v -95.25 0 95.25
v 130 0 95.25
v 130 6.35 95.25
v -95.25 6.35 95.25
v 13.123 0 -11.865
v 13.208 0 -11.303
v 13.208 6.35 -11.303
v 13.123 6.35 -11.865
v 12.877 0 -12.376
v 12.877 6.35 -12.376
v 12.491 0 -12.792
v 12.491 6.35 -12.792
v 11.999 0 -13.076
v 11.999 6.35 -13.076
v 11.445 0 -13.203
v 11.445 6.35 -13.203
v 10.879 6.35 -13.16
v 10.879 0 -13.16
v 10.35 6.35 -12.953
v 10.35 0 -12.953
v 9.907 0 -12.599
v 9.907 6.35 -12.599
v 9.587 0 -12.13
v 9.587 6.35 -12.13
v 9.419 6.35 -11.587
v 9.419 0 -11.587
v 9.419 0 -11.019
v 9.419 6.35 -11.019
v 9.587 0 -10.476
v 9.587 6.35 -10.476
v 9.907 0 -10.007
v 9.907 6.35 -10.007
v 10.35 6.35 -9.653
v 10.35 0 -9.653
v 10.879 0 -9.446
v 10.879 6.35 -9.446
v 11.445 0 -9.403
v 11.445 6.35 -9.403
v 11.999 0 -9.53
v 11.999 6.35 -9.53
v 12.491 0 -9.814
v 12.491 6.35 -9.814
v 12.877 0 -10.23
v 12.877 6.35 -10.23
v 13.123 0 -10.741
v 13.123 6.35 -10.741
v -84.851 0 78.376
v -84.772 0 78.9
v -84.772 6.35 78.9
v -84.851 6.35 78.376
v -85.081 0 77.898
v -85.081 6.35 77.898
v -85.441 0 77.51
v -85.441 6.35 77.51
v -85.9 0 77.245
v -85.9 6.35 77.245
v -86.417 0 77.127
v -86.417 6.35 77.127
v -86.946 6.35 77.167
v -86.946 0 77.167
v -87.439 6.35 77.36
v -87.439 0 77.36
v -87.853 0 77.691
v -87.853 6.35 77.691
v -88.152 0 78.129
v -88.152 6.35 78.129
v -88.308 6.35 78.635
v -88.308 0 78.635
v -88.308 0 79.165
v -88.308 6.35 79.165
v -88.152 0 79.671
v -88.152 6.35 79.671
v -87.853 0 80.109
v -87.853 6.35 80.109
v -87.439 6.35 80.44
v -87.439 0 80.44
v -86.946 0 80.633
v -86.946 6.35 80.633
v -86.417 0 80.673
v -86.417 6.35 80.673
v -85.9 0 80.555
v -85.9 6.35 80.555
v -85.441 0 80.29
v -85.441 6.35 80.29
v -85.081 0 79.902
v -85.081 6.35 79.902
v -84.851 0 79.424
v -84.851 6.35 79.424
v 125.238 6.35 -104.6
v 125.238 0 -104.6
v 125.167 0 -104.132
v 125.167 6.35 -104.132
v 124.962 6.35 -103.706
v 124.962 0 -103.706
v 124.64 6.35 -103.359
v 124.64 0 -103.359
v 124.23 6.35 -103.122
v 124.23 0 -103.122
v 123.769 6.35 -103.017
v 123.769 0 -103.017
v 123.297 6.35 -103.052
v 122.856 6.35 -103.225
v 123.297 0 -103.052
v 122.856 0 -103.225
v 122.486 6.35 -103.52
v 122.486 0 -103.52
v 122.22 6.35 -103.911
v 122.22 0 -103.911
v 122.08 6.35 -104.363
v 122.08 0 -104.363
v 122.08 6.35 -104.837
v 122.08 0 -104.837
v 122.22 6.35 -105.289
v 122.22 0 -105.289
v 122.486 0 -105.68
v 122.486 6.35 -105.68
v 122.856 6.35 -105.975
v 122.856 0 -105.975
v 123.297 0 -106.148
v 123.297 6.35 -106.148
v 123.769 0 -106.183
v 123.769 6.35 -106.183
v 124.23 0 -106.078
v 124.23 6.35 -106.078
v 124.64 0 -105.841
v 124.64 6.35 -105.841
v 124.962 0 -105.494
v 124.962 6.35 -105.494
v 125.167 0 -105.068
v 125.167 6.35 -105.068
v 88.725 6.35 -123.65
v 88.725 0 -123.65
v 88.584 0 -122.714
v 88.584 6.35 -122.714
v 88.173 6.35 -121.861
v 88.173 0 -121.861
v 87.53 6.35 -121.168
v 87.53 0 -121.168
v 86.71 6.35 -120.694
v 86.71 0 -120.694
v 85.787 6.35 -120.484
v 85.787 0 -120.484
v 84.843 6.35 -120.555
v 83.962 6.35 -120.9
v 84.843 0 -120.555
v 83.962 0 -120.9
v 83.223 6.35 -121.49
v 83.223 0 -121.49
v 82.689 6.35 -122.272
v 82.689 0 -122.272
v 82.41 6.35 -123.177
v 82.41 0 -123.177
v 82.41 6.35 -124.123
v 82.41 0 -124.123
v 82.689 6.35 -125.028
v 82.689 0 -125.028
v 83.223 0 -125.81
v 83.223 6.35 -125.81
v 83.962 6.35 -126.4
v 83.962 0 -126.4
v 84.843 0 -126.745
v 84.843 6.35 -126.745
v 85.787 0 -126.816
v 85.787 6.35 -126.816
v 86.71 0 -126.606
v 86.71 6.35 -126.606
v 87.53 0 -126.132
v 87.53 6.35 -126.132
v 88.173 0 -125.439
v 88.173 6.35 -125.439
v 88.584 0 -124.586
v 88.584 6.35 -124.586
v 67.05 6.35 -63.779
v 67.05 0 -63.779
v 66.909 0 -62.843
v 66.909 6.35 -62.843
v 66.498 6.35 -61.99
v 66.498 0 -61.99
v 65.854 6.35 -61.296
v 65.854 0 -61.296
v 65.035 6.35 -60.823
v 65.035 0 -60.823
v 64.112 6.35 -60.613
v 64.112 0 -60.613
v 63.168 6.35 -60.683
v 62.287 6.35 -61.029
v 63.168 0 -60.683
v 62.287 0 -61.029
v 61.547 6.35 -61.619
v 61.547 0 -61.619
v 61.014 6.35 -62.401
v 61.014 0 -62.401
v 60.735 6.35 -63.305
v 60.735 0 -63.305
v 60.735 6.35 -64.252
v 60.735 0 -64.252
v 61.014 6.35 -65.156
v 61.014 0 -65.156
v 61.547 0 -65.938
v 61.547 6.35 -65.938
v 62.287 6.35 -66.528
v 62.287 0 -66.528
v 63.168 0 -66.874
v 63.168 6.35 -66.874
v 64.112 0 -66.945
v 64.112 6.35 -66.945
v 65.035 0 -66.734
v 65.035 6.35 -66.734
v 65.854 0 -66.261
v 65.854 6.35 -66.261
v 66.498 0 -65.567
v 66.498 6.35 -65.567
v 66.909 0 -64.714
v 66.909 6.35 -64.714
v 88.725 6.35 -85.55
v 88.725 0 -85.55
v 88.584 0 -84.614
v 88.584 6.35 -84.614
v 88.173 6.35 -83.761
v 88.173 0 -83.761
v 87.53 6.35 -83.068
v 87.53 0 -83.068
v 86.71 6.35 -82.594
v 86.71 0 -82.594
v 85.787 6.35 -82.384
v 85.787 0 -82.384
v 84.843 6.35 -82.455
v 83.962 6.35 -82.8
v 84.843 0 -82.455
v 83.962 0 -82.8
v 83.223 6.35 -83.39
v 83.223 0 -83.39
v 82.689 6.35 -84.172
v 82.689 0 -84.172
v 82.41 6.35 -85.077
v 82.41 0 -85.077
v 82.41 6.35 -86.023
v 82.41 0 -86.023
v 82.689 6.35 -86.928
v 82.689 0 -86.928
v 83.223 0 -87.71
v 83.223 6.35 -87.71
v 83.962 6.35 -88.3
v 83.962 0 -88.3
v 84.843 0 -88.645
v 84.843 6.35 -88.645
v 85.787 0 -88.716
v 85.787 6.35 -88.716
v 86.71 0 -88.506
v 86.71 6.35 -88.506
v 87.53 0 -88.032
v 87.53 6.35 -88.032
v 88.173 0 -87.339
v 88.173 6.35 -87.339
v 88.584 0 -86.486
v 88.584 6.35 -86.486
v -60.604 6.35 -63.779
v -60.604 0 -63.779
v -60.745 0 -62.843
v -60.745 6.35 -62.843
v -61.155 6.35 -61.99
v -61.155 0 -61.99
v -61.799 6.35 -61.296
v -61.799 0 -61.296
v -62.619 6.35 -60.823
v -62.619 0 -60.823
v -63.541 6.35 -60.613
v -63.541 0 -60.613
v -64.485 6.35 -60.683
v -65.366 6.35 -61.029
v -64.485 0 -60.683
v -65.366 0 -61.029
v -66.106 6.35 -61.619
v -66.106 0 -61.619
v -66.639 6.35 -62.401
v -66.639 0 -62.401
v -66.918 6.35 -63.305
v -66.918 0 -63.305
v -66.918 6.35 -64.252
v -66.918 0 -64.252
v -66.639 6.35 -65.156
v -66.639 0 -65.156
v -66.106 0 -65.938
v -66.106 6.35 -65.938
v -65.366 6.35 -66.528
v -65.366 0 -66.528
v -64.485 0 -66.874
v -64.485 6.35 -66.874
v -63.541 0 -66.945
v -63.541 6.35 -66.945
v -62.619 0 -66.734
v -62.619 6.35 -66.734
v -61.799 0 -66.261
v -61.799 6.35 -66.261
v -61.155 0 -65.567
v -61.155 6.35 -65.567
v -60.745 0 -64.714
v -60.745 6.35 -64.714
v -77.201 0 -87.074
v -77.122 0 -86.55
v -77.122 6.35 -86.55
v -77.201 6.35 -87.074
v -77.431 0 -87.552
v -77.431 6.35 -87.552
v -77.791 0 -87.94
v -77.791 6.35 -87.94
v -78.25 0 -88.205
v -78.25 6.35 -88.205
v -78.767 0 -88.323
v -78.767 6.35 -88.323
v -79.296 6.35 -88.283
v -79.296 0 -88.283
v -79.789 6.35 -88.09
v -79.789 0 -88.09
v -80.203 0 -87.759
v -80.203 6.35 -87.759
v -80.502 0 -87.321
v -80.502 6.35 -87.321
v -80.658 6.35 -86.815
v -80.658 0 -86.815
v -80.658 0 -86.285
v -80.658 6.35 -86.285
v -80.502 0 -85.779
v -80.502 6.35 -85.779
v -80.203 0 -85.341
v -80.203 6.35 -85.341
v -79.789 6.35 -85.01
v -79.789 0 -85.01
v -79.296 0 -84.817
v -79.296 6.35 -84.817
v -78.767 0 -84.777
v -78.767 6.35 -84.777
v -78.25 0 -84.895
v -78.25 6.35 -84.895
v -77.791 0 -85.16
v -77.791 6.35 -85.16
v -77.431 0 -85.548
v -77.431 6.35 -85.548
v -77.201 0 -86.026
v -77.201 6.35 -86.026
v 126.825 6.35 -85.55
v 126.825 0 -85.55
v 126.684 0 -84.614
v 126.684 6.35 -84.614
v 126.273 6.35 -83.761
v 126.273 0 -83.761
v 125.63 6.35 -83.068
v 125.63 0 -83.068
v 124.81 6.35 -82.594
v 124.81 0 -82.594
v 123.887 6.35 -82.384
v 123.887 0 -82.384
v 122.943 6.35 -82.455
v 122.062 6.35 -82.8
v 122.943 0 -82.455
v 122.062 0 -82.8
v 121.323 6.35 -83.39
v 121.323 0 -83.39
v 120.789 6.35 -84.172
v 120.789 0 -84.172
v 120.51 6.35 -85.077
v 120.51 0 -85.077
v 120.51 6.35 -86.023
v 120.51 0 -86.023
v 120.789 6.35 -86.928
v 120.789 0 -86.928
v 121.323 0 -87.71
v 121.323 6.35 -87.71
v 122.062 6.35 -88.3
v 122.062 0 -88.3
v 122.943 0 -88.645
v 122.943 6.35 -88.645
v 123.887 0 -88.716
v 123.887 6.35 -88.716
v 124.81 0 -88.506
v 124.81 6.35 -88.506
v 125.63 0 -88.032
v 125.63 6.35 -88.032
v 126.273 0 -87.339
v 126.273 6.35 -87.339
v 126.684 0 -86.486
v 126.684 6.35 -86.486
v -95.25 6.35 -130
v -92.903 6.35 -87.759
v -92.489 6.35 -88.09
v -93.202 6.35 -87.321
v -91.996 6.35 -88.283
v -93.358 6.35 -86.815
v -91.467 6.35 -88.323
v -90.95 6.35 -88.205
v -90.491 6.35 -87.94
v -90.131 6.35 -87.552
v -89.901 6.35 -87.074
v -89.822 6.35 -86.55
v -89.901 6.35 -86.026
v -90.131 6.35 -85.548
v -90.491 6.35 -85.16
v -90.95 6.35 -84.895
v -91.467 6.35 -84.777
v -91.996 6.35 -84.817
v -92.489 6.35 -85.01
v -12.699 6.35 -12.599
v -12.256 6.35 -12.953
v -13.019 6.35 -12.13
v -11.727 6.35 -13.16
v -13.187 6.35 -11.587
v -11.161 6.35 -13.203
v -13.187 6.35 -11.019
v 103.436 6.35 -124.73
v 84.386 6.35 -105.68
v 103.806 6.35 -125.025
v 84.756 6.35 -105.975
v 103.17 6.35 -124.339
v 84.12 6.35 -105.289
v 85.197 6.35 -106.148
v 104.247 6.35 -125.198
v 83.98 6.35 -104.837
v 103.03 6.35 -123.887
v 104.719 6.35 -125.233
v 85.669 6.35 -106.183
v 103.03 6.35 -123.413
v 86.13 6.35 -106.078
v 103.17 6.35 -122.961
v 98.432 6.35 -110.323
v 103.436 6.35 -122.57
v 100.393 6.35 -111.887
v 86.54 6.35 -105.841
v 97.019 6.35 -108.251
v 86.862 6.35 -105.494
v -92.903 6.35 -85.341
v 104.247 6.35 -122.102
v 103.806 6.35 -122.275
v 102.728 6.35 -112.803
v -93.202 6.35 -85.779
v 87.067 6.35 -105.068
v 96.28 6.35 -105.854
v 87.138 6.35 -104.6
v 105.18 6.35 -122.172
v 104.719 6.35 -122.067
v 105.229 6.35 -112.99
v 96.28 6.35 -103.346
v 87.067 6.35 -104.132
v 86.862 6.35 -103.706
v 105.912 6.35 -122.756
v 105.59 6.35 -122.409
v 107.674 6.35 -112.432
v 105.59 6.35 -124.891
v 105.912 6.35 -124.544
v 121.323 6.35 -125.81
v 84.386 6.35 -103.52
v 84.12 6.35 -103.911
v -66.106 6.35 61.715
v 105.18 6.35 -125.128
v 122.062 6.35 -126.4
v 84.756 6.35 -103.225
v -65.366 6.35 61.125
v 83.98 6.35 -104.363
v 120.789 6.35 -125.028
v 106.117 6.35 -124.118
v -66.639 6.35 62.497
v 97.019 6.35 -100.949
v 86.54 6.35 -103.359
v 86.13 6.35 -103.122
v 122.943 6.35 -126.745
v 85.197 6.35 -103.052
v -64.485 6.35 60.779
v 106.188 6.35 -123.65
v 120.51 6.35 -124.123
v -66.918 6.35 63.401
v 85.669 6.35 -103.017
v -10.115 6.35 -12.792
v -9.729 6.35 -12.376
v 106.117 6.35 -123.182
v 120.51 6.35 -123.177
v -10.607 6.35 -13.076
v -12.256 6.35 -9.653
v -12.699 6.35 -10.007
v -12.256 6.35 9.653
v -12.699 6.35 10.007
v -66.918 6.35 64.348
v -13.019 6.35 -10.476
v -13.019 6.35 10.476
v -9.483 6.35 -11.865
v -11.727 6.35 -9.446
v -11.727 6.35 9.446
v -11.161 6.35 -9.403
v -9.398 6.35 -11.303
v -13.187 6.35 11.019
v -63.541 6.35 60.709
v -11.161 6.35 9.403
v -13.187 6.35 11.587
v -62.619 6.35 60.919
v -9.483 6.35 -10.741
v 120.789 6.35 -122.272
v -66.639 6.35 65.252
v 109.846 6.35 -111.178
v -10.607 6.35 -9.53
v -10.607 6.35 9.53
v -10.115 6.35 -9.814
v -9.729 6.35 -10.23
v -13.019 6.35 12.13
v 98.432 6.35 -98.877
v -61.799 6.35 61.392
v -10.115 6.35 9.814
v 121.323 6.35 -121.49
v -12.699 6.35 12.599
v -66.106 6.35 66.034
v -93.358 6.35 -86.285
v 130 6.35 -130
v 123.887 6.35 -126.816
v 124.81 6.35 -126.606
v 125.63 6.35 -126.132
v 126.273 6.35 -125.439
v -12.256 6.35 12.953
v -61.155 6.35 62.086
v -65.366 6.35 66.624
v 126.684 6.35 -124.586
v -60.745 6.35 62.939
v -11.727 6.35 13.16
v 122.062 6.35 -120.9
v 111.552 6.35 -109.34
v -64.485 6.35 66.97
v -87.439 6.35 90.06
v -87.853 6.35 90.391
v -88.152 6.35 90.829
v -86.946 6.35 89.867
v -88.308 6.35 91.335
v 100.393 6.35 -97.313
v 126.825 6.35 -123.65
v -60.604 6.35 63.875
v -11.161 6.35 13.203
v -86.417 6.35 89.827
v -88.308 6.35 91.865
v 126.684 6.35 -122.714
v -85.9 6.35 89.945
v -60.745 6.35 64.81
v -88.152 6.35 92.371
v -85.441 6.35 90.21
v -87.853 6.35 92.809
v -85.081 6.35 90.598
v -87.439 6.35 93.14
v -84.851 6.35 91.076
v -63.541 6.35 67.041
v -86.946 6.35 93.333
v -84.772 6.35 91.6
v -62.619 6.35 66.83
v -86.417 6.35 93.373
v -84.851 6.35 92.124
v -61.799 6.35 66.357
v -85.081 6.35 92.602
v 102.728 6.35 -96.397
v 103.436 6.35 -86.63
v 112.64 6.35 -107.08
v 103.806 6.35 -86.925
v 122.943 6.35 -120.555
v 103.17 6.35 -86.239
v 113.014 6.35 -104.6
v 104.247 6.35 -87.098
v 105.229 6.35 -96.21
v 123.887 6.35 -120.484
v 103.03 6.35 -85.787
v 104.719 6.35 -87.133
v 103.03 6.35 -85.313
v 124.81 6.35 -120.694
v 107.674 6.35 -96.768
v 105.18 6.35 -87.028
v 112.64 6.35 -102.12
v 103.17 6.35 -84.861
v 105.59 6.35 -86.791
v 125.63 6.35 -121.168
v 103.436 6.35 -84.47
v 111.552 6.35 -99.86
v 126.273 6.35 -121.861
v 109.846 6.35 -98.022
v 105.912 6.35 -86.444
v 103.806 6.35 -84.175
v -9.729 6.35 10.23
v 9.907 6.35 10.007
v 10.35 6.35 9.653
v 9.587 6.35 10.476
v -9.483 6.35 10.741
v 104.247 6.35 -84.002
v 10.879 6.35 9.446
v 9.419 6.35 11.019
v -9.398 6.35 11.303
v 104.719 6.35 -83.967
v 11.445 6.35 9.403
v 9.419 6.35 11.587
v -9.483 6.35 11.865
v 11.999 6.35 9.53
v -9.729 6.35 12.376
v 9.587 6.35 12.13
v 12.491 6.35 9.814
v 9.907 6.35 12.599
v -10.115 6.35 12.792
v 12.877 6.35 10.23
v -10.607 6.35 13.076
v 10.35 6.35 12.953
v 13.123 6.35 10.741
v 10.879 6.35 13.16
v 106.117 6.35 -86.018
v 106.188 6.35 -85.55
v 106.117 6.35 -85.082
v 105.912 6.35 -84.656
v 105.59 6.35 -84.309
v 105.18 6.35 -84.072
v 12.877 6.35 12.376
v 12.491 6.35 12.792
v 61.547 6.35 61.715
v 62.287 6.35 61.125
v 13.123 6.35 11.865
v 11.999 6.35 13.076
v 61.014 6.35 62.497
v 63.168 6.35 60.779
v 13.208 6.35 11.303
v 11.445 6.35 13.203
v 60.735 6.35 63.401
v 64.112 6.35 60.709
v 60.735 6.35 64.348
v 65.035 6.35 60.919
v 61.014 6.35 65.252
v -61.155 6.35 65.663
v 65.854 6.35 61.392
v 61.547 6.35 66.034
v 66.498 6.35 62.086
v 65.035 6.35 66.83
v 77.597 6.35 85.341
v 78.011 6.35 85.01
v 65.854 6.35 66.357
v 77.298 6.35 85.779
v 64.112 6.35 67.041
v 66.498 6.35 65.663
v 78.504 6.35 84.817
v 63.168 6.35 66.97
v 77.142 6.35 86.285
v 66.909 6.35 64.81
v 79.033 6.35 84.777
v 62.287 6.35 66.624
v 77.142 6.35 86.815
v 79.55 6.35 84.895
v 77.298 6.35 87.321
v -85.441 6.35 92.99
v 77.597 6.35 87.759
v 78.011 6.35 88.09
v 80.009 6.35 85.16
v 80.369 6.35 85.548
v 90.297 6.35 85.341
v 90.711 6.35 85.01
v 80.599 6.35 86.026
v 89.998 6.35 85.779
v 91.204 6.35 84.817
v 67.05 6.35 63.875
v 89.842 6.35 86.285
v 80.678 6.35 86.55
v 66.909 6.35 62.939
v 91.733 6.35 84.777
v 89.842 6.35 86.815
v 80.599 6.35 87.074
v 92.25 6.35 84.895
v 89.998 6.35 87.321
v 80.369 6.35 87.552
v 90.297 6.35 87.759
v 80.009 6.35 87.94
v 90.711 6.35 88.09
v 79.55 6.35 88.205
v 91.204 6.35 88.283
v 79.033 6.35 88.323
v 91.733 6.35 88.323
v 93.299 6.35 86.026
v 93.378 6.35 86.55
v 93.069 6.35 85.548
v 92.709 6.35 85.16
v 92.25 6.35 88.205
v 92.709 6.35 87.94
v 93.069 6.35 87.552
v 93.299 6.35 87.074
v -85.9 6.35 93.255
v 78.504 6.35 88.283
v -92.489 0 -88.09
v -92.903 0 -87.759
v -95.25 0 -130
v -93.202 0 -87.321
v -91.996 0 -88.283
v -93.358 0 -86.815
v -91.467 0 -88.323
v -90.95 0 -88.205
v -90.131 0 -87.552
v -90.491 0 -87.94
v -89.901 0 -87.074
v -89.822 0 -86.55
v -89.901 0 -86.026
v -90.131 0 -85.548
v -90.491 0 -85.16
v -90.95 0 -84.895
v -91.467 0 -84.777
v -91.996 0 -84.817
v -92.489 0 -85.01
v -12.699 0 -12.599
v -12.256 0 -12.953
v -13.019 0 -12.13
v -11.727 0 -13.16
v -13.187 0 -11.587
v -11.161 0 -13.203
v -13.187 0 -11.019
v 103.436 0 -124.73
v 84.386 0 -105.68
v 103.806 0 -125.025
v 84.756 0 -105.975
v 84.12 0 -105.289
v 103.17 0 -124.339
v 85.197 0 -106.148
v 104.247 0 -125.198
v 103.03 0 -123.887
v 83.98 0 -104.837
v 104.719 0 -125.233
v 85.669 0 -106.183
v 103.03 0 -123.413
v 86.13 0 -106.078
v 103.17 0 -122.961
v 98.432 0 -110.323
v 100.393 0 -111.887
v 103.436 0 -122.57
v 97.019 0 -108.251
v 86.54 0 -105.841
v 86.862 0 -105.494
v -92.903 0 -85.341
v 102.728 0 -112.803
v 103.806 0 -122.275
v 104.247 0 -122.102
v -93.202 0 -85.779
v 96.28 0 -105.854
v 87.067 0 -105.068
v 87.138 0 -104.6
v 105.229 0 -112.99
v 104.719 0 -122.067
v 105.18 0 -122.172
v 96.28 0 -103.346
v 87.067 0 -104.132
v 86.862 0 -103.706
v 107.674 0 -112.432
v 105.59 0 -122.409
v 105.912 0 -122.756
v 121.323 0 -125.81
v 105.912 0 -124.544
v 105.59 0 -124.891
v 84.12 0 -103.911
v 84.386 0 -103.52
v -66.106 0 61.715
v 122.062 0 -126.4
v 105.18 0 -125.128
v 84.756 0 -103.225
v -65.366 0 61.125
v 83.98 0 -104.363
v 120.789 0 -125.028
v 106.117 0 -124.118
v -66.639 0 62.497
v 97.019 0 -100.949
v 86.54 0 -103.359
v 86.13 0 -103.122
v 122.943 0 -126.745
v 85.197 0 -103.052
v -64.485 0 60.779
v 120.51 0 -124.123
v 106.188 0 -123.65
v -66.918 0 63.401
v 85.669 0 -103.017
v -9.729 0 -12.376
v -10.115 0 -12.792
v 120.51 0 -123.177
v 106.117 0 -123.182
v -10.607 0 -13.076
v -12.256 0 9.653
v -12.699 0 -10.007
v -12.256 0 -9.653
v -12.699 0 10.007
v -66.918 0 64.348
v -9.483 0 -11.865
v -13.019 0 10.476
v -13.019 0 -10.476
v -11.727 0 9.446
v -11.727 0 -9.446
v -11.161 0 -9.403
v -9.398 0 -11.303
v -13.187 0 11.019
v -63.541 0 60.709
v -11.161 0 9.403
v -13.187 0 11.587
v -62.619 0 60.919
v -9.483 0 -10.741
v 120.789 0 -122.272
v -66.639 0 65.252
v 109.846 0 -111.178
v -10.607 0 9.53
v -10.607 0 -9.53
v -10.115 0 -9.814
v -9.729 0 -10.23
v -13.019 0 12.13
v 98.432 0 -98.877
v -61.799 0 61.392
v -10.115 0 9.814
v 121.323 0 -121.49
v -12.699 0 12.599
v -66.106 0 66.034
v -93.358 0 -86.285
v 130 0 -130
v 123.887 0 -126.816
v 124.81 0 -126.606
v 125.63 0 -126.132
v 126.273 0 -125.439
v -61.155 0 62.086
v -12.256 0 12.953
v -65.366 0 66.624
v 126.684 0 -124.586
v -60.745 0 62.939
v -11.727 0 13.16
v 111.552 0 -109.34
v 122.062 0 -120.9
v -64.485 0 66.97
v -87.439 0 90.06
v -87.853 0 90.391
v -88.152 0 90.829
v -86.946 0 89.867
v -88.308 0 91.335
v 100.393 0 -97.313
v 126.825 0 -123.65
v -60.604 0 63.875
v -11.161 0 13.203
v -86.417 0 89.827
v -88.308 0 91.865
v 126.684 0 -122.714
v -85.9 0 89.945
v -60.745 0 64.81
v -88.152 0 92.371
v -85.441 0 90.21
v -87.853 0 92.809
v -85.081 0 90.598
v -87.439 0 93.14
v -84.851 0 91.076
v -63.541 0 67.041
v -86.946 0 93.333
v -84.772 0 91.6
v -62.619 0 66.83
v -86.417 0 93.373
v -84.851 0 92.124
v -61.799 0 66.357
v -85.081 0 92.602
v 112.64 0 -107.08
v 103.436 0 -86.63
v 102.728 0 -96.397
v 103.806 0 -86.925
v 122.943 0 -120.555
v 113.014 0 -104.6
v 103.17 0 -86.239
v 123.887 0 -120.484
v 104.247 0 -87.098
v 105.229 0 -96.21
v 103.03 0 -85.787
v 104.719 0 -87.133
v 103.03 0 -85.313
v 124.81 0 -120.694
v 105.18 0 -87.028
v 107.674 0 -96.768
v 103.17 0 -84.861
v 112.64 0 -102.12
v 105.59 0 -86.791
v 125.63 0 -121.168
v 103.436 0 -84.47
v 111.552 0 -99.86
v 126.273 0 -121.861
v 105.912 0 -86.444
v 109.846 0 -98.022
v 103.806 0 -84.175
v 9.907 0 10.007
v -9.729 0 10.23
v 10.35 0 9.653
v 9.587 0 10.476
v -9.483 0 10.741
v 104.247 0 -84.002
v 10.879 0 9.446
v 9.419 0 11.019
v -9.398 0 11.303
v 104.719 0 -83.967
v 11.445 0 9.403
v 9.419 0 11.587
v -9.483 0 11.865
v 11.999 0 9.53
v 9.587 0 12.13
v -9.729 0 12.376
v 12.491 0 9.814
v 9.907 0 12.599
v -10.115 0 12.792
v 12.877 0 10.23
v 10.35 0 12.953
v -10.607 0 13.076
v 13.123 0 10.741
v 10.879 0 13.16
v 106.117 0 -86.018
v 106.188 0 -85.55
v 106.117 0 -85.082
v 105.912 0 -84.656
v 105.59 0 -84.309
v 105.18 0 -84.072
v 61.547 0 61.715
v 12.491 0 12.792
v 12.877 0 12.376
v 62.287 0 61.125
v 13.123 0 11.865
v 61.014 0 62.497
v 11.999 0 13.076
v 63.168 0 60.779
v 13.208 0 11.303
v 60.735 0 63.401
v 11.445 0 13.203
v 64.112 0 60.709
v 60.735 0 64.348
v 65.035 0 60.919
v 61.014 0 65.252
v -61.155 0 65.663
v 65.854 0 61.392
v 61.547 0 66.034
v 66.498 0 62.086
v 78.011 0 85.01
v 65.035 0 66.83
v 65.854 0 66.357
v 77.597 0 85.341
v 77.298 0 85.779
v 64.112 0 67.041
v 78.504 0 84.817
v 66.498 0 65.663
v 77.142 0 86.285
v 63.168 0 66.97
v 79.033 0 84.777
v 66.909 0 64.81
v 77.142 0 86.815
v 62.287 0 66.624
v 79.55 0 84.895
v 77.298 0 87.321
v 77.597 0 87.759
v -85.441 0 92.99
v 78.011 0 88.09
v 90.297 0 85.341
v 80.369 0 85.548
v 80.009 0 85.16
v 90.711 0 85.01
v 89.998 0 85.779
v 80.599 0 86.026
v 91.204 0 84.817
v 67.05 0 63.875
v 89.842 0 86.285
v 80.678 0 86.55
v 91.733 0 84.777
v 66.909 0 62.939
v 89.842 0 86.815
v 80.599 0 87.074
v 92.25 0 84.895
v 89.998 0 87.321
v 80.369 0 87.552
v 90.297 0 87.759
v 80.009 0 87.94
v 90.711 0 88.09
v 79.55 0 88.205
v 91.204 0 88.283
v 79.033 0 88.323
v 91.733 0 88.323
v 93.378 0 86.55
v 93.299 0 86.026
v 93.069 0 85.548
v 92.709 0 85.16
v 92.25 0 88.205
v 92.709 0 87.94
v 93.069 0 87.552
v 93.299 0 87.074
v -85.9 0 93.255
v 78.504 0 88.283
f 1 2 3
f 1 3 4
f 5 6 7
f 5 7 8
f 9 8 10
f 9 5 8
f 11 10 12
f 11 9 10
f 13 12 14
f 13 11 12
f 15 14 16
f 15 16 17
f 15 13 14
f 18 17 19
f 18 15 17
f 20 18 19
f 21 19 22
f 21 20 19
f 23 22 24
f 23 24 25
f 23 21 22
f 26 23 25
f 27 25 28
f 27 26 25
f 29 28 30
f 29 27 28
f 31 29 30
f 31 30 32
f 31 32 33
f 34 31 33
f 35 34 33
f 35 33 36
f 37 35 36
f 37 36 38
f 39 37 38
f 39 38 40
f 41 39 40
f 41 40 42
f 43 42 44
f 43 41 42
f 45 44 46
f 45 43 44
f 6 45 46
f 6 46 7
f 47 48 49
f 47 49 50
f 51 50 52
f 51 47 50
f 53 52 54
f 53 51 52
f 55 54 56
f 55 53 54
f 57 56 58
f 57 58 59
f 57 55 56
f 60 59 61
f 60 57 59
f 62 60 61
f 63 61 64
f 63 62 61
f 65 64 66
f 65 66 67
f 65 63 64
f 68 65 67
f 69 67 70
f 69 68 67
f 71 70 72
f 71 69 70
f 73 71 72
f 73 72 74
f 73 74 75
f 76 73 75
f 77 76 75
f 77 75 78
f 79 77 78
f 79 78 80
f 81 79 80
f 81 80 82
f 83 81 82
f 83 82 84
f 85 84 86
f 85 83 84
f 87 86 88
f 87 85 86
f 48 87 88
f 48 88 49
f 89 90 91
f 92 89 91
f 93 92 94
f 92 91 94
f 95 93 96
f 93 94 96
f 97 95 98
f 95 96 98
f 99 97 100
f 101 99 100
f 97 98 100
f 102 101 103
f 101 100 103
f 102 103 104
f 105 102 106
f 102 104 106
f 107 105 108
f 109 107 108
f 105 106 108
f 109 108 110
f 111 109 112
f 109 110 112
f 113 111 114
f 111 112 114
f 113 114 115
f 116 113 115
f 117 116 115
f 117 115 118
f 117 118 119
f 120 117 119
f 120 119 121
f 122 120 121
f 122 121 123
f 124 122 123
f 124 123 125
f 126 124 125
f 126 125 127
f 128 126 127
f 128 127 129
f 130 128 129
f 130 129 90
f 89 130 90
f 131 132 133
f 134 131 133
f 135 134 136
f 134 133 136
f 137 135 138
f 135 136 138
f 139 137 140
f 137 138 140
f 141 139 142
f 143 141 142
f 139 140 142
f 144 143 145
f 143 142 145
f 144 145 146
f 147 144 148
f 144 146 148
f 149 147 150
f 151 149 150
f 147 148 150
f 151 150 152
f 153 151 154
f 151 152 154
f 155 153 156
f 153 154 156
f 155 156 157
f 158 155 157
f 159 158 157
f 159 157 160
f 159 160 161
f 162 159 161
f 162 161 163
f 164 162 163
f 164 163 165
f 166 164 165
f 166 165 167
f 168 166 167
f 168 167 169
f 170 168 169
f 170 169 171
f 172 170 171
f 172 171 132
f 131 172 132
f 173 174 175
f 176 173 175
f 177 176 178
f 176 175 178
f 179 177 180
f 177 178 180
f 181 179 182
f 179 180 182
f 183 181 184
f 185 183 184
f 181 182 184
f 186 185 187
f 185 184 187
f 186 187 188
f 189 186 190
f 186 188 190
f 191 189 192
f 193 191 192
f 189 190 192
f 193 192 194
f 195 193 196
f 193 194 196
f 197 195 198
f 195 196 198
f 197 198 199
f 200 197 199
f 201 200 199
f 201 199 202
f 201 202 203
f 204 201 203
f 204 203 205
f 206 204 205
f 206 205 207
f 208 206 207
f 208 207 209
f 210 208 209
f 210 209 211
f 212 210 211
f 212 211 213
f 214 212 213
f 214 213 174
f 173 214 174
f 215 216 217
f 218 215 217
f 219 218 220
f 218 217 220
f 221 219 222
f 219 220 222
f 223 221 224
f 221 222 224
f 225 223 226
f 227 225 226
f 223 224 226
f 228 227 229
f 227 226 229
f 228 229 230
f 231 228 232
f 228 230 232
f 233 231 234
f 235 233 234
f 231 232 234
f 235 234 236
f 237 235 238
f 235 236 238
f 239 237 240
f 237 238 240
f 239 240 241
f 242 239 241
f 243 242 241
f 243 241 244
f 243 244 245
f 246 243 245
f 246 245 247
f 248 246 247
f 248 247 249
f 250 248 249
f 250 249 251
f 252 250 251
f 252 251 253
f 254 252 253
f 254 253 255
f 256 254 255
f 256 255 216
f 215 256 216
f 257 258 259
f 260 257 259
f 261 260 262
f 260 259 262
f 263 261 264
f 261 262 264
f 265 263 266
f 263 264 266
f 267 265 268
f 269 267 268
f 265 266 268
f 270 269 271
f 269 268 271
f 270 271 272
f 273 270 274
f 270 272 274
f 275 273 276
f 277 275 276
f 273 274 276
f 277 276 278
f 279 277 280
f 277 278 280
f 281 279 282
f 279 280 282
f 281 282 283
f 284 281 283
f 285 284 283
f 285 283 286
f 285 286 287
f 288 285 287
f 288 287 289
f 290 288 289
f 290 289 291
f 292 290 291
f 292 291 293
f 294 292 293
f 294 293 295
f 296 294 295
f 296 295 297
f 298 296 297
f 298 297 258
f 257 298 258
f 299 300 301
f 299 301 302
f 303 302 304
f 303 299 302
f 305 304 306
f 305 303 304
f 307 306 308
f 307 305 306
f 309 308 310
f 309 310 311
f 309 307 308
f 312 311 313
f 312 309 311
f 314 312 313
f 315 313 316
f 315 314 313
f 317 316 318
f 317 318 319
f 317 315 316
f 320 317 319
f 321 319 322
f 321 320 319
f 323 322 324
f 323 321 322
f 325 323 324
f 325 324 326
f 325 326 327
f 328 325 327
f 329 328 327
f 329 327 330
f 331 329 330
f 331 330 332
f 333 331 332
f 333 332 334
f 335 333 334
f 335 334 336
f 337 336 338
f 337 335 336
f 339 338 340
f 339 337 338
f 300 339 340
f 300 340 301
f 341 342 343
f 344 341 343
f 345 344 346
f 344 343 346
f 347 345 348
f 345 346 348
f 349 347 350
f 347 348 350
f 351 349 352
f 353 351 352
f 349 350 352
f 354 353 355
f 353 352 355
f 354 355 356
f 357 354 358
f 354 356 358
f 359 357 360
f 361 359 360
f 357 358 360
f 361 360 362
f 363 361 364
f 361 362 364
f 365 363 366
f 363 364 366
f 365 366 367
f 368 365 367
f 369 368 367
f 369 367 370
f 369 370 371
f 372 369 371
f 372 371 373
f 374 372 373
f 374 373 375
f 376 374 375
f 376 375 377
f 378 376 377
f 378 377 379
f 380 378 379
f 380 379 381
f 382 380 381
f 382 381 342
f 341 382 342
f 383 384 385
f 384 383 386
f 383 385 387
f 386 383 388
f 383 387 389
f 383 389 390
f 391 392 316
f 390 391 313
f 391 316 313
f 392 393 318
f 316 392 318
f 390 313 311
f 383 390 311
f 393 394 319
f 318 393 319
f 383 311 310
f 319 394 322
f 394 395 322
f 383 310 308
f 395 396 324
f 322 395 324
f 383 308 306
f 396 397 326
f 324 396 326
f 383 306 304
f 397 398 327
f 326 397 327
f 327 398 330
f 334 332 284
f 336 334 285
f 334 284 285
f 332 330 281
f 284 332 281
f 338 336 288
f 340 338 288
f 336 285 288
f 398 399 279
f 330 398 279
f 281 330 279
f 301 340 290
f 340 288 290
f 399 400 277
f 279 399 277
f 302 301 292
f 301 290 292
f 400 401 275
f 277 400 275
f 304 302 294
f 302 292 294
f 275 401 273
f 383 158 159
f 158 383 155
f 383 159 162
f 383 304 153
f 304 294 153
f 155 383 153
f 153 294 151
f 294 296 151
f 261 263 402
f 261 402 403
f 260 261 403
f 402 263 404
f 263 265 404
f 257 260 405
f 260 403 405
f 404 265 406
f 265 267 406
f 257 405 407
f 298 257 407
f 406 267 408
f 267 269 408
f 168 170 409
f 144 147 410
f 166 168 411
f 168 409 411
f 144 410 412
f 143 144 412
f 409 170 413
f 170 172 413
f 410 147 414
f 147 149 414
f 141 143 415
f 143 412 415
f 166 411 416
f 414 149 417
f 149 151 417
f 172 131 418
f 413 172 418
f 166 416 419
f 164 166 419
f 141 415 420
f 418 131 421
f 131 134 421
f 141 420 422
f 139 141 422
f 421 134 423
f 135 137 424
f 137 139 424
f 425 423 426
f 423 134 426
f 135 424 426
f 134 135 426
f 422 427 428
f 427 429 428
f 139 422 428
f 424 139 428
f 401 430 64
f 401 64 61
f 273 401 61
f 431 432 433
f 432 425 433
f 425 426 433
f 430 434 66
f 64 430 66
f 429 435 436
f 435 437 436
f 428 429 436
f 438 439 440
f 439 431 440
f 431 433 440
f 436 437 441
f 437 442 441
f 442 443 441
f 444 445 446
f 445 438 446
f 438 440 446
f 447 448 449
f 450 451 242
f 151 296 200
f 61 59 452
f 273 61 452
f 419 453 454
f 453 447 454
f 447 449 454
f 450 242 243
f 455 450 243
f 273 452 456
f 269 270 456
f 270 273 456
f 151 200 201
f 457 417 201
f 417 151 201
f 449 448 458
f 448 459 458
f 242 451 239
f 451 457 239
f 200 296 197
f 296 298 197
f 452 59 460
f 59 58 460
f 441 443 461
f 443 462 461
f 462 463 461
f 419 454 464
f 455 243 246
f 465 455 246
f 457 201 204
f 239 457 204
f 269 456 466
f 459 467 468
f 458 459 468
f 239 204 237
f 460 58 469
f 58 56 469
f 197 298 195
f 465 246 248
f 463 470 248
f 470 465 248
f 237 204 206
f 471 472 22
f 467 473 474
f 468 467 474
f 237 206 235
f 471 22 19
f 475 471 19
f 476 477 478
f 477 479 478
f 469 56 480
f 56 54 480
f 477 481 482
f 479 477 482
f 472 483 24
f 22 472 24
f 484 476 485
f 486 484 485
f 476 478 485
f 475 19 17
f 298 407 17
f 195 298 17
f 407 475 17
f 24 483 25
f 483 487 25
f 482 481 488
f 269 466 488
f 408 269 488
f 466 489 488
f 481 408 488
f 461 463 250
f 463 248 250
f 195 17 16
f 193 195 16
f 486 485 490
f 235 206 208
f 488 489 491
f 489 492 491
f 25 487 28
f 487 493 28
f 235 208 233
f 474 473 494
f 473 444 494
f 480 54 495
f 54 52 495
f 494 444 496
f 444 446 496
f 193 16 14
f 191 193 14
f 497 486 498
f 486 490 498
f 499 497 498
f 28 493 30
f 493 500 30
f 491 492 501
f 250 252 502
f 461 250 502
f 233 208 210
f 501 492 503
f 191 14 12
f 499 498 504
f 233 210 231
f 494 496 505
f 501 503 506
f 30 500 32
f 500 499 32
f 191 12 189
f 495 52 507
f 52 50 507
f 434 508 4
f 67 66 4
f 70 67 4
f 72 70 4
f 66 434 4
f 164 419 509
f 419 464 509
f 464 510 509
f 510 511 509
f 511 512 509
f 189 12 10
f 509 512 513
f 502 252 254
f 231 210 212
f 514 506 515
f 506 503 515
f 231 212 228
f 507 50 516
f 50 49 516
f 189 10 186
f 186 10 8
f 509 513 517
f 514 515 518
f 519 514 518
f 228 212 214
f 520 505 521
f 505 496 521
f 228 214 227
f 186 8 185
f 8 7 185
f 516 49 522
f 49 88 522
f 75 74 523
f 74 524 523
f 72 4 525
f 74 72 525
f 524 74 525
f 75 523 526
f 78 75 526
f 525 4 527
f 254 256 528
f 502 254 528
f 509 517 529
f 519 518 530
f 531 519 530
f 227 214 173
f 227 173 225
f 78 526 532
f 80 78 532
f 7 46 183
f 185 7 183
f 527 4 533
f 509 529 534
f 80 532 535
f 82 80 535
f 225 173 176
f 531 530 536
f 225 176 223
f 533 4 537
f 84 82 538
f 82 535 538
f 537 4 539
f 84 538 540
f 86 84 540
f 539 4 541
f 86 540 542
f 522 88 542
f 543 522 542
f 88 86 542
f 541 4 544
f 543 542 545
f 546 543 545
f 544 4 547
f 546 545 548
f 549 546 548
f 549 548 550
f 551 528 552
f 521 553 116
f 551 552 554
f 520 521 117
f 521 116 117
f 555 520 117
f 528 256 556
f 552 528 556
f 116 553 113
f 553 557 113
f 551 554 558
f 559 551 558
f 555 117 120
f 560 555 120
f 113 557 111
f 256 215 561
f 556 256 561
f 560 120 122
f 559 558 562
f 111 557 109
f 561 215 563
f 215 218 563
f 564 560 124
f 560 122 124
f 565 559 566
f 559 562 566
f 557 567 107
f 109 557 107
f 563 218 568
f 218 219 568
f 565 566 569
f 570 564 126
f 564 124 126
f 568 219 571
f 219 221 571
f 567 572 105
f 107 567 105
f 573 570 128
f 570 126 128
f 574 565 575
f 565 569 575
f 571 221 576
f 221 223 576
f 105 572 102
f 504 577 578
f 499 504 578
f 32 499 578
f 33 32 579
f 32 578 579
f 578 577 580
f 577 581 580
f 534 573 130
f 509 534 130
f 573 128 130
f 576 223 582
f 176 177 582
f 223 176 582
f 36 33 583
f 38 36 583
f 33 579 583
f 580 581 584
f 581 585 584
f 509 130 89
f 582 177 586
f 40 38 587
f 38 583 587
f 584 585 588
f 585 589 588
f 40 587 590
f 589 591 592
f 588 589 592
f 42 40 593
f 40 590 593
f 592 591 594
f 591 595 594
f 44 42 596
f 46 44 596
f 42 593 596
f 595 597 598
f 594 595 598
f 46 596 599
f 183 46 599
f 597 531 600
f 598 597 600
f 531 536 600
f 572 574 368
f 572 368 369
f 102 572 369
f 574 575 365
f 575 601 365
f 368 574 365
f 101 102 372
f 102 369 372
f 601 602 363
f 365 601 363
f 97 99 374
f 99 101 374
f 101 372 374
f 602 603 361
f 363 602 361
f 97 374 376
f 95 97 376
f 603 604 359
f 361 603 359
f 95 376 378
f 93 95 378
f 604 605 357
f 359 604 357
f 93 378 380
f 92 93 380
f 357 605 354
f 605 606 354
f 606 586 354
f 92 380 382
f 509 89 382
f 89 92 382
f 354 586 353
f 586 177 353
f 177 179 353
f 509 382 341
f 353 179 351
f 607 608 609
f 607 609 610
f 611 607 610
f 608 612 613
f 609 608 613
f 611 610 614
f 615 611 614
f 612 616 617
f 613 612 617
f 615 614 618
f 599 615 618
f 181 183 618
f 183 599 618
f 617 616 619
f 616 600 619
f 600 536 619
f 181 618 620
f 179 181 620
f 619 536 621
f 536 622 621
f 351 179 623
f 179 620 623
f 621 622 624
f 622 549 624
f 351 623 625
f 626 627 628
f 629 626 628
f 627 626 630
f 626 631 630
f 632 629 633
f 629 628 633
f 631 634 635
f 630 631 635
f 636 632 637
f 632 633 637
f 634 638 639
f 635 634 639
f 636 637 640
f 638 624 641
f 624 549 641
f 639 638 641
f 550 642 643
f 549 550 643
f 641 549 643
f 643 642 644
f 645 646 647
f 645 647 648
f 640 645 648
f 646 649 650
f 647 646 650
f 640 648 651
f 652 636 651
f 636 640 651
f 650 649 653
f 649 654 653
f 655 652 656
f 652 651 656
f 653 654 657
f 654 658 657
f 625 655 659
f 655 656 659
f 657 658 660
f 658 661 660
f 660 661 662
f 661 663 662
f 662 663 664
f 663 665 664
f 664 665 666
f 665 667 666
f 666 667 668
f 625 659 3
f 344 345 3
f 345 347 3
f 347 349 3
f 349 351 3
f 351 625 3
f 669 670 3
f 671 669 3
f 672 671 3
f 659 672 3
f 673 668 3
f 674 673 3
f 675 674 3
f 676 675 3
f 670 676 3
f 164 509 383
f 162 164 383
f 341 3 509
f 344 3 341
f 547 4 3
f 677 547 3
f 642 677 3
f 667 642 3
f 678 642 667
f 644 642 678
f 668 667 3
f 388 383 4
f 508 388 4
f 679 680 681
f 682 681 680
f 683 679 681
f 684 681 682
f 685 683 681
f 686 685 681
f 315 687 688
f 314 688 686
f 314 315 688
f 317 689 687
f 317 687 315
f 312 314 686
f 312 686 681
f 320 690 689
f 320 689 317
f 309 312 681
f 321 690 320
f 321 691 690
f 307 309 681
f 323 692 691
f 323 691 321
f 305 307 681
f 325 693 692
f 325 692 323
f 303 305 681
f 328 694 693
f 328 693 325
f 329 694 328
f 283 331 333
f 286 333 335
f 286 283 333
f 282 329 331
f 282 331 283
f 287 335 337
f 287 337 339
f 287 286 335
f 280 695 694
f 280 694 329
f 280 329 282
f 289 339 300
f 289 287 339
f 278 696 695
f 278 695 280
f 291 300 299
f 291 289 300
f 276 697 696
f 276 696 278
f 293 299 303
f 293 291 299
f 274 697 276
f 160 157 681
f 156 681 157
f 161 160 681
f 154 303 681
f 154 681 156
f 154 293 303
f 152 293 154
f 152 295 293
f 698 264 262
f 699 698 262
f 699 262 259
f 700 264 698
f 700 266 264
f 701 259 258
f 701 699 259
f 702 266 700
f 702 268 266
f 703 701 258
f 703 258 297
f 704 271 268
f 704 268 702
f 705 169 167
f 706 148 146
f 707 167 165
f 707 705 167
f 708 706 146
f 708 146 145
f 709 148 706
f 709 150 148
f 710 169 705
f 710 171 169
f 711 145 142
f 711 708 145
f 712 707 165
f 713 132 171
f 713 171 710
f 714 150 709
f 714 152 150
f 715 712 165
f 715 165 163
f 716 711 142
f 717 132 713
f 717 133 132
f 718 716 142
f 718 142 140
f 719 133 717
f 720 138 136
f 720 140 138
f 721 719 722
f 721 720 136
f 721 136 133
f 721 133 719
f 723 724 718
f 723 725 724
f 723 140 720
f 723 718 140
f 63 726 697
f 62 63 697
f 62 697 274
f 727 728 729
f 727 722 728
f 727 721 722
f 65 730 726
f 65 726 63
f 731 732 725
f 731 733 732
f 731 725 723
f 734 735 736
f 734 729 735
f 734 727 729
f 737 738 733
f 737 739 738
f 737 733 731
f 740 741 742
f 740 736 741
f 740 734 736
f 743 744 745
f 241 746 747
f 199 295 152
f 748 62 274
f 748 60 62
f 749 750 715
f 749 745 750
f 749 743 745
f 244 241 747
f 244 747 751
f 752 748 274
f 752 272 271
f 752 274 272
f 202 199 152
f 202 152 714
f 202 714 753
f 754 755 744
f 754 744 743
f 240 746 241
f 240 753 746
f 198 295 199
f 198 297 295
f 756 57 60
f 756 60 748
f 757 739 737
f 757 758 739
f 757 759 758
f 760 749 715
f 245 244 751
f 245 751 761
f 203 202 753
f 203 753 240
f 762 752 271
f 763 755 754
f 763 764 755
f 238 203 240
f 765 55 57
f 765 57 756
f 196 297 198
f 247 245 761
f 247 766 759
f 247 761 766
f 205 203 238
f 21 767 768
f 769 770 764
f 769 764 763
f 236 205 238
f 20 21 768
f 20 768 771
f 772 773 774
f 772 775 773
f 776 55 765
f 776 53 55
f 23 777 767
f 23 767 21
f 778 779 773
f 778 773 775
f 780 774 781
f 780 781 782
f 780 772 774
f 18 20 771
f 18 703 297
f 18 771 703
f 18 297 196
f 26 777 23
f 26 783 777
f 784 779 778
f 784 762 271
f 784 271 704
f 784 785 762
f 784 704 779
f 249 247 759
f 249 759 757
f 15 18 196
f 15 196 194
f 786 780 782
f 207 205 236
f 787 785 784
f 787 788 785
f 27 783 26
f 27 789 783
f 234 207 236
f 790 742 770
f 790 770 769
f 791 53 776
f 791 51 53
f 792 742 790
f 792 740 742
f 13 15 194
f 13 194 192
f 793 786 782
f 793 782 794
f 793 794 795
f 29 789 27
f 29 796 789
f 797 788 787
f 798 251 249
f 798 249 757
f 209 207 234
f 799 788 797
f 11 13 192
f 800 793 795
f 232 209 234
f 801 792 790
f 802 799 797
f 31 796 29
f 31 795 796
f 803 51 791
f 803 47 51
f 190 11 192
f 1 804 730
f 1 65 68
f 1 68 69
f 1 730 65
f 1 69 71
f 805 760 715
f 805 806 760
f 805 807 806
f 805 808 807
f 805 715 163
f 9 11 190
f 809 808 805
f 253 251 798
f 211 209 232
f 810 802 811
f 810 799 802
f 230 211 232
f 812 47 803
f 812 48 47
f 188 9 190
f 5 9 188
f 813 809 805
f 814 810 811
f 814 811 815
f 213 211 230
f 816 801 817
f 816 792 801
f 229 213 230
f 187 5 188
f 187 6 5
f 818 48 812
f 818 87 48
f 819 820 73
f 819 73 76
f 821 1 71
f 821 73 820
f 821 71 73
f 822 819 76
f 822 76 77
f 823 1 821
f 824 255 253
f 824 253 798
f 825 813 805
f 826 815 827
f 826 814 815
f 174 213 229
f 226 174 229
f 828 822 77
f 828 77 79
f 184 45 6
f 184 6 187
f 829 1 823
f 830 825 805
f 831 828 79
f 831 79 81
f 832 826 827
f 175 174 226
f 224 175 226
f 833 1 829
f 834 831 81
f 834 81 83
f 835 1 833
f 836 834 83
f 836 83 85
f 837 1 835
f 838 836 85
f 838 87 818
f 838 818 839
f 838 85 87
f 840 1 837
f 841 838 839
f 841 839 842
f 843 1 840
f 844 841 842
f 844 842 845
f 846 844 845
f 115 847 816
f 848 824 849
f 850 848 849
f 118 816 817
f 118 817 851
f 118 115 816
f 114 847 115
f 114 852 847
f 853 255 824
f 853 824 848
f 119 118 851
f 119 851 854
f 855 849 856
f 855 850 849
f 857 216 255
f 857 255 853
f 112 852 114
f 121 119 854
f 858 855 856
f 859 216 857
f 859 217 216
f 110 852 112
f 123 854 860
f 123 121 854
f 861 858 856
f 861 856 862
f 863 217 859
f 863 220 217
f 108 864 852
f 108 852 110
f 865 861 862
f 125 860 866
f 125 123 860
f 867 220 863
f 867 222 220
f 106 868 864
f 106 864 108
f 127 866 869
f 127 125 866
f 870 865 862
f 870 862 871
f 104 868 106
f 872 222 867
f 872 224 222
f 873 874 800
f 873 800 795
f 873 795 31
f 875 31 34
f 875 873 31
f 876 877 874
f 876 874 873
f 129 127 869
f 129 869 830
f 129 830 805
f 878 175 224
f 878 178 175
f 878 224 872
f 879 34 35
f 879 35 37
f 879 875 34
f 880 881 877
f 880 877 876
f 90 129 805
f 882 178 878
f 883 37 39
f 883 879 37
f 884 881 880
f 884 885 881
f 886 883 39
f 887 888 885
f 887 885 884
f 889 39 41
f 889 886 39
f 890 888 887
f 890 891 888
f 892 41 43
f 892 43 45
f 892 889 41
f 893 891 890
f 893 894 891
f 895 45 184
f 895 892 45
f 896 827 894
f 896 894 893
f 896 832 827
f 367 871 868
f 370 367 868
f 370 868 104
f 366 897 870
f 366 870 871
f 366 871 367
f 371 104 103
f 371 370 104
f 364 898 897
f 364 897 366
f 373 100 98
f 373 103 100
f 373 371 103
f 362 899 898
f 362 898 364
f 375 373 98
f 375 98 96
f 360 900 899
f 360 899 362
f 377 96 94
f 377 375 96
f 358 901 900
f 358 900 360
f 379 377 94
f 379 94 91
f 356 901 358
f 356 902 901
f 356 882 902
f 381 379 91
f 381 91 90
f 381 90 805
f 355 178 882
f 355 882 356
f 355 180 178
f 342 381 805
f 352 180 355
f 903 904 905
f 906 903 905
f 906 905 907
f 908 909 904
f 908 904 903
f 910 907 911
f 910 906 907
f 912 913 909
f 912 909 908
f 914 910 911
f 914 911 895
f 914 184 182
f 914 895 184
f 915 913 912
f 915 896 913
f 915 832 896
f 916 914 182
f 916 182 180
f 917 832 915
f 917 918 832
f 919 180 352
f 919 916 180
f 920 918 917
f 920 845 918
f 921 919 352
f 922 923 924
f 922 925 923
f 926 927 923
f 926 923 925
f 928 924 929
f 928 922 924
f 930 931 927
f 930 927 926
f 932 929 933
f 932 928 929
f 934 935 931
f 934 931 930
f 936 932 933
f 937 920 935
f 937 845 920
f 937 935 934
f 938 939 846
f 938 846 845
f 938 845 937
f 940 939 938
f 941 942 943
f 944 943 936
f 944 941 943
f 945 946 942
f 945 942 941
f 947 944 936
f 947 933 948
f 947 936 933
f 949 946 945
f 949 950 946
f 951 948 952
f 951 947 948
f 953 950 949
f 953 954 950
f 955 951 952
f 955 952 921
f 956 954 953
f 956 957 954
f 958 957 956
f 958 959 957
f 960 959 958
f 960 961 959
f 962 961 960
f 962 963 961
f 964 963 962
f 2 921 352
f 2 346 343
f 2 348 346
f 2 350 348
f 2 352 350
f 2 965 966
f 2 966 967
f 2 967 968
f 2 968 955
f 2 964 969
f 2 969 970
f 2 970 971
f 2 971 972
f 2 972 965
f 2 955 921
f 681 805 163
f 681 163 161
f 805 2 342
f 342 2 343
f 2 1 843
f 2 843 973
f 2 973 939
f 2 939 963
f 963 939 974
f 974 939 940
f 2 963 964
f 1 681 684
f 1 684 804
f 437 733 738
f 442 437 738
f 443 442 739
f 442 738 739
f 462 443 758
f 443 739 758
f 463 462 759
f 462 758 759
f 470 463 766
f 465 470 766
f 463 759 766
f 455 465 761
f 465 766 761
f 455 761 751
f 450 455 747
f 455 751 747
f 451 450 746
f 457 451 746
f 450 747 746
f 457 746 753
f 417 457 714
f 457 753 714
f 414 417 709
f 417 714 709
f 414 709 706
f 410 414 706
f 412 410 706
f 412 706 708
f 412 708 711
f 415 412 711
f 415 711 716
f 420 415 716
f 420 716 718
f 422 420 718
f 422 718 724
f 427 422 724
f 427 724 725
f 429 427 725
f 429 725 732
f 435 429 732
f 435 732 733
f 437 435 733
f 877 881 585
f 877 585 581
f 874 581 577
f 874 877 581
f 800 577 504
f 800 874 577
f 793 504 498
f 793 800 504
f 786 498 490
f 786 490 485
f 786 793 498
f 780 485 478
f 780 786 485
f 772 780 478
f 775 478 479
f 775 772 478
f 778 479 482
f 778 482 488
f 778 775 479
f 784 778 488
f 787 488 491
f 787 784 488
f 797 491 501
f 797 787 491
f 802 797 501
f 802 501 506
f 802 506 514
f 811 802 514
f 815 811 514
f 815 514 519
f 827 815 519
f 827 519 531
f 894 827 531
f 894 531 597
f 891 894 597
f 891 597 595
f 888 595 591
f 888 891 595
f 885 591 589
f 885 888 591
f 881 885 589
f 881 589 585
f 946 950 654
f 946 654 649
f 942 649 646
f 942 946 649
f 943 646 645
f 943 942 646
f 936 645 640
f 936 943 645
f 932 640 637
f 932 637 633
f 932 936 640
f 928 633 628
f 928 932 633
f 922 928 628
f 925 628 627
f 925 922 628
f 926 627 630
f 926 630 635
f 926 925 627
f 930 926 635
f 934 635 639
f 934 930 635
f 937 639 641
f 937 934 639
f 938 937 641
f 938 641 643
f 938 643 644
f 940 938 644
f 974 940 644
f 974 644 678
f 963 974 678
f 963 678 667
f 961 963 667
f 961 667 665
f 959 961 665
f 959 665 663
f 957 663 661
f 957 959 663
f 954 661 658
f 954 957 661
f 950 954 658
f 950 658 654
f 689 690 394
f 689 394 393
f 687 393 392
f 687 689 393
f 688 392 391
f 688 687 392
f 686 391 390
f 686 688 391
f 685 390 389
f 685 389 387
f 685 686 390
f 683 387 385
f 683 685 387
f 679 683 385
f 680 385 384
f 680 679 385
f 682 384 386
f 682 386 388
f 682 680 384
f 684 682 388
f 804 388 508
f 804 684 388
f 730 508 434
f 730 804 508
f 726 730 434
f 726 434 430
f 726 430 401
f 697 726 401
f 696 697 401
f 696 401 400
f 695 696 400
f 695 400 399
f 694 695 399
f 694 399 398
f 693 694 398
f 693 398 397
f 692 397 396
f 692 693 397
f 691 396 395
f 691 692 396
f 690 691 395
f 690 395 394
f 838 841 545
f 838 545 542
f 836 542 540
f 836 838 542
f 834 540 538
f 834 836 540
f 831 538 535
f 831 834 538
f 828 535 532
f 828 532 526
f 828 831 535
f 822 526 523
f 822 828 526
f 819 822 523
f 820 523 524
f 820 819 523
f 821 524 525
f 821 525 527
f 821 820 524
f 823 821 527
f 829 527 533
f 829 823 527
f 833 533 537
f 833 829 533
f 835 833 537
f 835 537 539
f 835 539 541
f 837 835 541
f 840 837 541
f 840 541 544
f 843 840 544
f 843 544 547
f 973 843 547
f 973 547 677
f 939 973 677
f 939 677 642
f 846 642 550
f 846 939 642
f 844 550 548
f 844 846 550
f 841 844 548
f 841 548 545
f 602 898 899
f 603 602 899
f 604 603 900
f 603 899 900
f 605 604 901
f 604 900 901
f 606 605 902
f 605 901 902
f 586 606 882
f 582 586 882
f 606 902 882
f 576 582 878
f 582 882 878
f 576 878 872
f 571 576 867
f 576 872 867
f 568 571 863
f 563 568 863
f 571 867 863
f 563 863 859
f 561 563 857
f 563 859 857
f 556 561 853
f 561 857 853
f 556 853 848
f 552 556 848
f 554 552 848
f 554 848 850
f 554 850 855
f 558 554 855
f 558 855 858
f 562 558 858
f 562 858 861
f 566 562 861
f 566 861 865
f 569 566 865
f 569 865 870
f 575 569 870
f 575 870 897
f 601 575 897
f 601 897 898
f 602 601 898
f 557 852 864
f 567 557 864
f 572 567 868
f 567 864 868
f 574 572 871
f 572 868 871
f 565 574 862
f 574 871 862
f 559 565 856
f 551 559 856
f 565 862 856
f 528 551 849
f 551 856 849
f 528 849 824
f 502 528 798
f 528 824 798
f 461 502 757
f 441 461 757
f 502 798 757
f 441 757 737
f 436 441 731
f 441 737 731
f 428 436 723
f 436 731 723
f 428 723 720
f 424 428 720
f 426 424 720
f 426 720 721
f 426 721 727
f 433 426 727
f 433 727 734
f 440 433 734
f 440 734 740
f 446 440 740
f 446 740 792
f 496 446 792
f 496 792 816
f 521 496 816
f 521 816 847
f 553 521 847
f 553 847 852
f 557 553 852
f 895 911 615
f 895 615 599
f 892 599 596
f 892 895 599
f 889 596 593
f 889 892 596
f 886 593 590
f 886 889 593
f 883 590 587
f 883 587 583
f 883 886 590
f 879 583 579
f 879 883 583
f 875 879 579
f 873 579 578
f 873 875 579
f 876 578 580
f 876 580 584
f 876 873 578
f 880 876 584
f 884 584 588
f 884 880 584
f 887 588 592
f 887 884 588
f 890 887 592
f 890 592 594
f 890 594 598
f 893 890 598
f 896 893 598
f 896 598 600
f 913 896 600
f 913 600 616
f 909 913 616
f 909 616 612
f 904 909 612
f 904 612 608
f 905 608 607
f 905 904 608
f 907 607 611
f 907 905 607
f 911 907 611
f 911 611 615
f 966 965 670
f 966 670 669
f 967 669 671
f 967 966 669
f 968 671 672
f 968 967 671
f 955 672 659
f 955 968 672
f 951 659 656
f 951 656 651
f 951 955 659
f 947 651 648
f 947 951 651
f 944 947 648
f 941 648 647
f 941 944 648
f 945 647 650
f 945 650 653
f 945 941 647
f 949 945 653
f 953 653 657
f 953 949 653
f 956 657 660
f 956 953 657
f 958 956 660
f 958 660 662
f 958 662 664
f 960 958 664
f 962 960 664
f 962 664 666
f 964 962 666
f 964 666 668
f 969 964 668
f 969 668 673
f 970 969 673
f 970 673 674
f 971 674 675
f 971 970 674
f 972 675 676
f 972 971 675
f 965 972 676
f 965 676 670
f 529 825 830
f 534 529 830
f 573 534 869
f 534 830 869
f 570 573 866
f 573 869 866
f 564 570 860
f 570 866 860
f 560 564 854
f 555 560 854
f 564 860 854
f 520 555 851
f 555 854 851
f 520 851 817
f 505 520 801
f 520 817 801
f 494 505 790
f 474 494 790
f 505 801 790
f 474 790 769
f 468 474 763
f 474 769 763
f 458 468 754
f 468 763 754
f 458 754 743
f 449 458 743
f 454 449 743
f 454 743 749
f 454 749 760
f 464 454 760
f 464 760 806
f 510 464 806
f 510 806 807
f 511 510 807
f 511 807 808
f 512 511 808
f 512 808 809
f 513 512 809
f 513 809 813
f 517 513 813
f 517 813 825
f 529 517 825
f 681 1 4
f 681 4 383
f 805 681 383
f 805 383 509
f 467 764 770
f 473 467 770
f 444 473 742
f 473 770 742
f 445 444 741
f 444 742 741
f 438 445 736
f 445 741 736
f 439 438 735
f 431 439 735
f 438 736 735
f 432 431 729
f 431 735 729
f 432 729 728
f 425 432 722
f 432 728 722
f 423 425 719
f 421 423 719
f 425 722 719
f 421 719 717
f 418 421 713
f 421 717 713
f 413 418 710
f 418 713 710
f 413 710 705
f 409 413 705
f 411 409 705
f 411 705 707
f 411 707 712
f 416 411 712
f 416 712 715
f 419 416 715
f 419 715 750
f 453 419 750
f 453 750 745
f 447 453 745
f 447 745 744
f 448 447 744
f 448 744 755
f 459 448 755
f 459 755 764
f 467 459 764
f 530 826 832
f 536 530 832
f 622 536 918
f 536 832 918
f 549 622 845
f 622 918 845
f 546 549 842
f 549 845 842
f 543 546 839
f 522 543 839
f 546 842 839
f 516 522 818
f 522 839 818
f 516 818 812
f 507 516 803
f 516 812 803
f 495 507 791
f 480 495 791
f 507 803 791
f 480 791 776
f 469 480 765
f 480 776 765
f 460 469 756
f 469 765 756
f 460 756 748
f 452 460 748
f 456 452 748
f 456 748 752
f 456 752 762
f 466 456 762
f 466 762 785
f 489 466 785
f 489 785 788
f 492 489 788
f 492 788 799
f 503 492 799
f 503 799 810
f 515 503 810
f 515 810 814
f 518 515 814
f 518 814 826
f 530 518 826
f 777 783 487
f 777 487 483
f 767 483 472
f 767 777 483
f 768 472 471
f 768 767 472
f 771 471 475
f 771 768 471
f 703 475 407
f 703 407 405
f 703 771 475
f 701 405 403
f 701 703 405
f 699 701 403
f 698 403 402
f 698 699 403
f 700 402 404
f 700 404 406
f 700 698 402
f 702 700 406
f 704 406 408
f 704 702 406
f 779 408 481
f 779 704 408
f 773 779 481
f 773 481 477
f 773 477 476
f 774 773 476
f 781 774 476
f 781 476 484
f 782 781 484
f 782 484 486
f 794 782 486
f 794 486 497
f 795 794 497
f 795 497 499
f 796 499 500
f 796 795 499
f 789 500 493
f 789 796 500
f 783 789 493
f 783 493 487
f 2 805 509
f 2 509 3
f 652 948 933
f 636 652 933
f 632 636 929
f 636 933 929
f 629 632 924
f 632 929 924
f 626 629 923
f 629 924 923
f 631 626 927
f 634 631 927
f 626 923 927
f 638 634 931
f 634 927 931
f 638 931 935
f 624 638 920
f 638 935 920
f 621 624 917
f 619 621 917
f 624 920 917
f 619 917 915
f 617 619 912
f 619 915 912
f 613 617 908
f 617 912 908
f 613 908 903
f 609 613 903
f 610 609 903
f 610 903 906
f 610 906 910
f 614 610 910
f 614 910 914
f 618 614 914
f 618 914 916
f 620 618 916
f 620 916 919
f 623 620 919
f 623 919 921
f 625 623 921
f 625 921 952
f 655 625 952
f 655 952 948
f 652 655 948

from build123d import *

# Parameters (mm, degrees)
SKETCH1_W           = 190.5
SKETCH1_H           = 190.5
SKETCH1_R           = 1.905
SKETCH1_R_2         = 1.778
BOSS_EXTRUDE1_DEPTH = 6.35
BOSS_EXTRUDE3_DEPTH = 6.35
SKETCH8_R           = 3.175
CUT_EXTRUDE1_DEPTH  = 7.35
SKETCH9_R           = 3.175
CUT_EXTRUDE2_DEPTH  = 7.35
SKETCH10_R          = 1.5875
CUT_EXTRUDE3_DEPTH  = 7.35
SKETCH11_R          = 8.41375
CUT_EXTRUDE4_DEPTH  = 7.35


with BuildPart() as part:
    # Sketch1 → Boss-Extrude1 (new body)
    with BuildSketch(Plane(origin=(0, 0, 0), x_dir=(1, 0, 0), z_dir=(0, 1, 0))):
        Rectangle(SKETCH1_W, SKETCH1_H)
        with Locations((-11.303, 11.303)):
            Circle(SKETCH1_R, mode=Mode.SUBTRACT)
        with Locations((-11.303, -11.303)):
            Circle(SKETCH1_R, mode=Mode.SUBTRACT)
        with Locations((11.303, 11.303)):
            Circle(SKETCH1_R, mode=Mode.SUBTRACT)
        with Locations((11.303, -11.303)):
            Circle(SKETCH1_R, mode=Mode.SUBTRACT)
        with Locations((-78.9, 86.55)):
            Circle(SKETCH1_R_2, mode=Mode.SUBTRACT)
        with Locations((-91.6, 86.55)):
            Circle(SKETCH1_R_2, mode=Mode.SUBTRACT)
        with Locations((91.6, -86.55)):
            Circle(SKETCH1_R_2, mode=Mode.SUBTRACT)
        with Locations((78.9, -86.55)):
            Circle(SKETCH1_R_2, mode=Mode.SUBTRACT)
        with Locations((-86.55, -78.9)):
            Circle(SKETCH1_R_2, mode=Mode.SUBTRACT)
        with Locations((-86.55, -91.6)):
            Circle(SKETCH1_R_2, mode=Mode.SUBTRACT)
    extrude(amount=BOSS_EXTRUDE1_DEPTH)

    # Sketch7 → Boss-Extrude3 (add)
    with BuildSketch(Plane.XZ):
        Polygon((-95.25, -130), (78.2, -130), (130, -130), (130, -78.2), (130, 95.25), (95.25, 95.25), (95.25, -95.25), (-95.25, -95.25), align=None)
    extrude(amount=-BOSS_EXTRUDE3_DEPTH)

    # Sketch8 → Cut-Extrude1 (cut, through all)
    with BuildSketch(Plane.XZ):
        with Locations((-63.77864005, -63.77864005)):
            Circle(SKETCH8_R)
        with Locations((-63.77864005, 63.87464005)):
            Circle(SKETCH8_R)
        with Locations((63.87464005, 63.87464005)):
            Circle(SKETCH8_R)
        with Locations((63.87464005, -63.77864005)):
            Circle(SKETCH8_R)
    extrude(amount=-CUT_EXTRUDE1_DEPTH, mode=Mode.SUBTRACT)

    # Sketch9 → Cut-Extrude2 (cut, through all)
    with BuildSketch(Plane.XZ):
        with Locations((123.65, -123.65)):
            Circle(SKETCH9_R)
        with Locations((85.55, -85.55)):
            Circle(SKETCH9_R)
        with Locations((123.65, -85.55)):
            Circle(SKETCH9_R)
        with Locations((85.55, -123.65)):
            Circle(SKETCH9_R)
    extrude(amount=-CUT_EXTRUDE2_DEPTH, mode=Mode.SUBTRACT)

    # Sketch10 → Cut-Extrude3 (cut, through all)
    with BuildSketch(Plane.XZ):
        with Locations((104.6, -123.65)):
            Circle(SKETCH10_R)
        with Locations((85.55, -104.6)):
            Circle(SKETCH10_R)
        with Locations((104.6, -85.55)):
            Circle(SKETCH10_R)
        with Locations((123.65, -104.6)):
            Circle(SKETCH10_R)
    extrude(amount=-CUT_EXTRUDE3_DEPTH, mode=Mode.SUBTRACT)

    # Sketch11 → Cut-Extrude4 (cut, through all)
    with BuildSketch(Plane.XZ):
        with Locations((104.6, -104.6)):
            Circle(SKETCH11_R)
    extrude(amount=-CUT_EXTRUDE4_DEPTH, mode=Mode.SUBTRACT)


solid = part.part
